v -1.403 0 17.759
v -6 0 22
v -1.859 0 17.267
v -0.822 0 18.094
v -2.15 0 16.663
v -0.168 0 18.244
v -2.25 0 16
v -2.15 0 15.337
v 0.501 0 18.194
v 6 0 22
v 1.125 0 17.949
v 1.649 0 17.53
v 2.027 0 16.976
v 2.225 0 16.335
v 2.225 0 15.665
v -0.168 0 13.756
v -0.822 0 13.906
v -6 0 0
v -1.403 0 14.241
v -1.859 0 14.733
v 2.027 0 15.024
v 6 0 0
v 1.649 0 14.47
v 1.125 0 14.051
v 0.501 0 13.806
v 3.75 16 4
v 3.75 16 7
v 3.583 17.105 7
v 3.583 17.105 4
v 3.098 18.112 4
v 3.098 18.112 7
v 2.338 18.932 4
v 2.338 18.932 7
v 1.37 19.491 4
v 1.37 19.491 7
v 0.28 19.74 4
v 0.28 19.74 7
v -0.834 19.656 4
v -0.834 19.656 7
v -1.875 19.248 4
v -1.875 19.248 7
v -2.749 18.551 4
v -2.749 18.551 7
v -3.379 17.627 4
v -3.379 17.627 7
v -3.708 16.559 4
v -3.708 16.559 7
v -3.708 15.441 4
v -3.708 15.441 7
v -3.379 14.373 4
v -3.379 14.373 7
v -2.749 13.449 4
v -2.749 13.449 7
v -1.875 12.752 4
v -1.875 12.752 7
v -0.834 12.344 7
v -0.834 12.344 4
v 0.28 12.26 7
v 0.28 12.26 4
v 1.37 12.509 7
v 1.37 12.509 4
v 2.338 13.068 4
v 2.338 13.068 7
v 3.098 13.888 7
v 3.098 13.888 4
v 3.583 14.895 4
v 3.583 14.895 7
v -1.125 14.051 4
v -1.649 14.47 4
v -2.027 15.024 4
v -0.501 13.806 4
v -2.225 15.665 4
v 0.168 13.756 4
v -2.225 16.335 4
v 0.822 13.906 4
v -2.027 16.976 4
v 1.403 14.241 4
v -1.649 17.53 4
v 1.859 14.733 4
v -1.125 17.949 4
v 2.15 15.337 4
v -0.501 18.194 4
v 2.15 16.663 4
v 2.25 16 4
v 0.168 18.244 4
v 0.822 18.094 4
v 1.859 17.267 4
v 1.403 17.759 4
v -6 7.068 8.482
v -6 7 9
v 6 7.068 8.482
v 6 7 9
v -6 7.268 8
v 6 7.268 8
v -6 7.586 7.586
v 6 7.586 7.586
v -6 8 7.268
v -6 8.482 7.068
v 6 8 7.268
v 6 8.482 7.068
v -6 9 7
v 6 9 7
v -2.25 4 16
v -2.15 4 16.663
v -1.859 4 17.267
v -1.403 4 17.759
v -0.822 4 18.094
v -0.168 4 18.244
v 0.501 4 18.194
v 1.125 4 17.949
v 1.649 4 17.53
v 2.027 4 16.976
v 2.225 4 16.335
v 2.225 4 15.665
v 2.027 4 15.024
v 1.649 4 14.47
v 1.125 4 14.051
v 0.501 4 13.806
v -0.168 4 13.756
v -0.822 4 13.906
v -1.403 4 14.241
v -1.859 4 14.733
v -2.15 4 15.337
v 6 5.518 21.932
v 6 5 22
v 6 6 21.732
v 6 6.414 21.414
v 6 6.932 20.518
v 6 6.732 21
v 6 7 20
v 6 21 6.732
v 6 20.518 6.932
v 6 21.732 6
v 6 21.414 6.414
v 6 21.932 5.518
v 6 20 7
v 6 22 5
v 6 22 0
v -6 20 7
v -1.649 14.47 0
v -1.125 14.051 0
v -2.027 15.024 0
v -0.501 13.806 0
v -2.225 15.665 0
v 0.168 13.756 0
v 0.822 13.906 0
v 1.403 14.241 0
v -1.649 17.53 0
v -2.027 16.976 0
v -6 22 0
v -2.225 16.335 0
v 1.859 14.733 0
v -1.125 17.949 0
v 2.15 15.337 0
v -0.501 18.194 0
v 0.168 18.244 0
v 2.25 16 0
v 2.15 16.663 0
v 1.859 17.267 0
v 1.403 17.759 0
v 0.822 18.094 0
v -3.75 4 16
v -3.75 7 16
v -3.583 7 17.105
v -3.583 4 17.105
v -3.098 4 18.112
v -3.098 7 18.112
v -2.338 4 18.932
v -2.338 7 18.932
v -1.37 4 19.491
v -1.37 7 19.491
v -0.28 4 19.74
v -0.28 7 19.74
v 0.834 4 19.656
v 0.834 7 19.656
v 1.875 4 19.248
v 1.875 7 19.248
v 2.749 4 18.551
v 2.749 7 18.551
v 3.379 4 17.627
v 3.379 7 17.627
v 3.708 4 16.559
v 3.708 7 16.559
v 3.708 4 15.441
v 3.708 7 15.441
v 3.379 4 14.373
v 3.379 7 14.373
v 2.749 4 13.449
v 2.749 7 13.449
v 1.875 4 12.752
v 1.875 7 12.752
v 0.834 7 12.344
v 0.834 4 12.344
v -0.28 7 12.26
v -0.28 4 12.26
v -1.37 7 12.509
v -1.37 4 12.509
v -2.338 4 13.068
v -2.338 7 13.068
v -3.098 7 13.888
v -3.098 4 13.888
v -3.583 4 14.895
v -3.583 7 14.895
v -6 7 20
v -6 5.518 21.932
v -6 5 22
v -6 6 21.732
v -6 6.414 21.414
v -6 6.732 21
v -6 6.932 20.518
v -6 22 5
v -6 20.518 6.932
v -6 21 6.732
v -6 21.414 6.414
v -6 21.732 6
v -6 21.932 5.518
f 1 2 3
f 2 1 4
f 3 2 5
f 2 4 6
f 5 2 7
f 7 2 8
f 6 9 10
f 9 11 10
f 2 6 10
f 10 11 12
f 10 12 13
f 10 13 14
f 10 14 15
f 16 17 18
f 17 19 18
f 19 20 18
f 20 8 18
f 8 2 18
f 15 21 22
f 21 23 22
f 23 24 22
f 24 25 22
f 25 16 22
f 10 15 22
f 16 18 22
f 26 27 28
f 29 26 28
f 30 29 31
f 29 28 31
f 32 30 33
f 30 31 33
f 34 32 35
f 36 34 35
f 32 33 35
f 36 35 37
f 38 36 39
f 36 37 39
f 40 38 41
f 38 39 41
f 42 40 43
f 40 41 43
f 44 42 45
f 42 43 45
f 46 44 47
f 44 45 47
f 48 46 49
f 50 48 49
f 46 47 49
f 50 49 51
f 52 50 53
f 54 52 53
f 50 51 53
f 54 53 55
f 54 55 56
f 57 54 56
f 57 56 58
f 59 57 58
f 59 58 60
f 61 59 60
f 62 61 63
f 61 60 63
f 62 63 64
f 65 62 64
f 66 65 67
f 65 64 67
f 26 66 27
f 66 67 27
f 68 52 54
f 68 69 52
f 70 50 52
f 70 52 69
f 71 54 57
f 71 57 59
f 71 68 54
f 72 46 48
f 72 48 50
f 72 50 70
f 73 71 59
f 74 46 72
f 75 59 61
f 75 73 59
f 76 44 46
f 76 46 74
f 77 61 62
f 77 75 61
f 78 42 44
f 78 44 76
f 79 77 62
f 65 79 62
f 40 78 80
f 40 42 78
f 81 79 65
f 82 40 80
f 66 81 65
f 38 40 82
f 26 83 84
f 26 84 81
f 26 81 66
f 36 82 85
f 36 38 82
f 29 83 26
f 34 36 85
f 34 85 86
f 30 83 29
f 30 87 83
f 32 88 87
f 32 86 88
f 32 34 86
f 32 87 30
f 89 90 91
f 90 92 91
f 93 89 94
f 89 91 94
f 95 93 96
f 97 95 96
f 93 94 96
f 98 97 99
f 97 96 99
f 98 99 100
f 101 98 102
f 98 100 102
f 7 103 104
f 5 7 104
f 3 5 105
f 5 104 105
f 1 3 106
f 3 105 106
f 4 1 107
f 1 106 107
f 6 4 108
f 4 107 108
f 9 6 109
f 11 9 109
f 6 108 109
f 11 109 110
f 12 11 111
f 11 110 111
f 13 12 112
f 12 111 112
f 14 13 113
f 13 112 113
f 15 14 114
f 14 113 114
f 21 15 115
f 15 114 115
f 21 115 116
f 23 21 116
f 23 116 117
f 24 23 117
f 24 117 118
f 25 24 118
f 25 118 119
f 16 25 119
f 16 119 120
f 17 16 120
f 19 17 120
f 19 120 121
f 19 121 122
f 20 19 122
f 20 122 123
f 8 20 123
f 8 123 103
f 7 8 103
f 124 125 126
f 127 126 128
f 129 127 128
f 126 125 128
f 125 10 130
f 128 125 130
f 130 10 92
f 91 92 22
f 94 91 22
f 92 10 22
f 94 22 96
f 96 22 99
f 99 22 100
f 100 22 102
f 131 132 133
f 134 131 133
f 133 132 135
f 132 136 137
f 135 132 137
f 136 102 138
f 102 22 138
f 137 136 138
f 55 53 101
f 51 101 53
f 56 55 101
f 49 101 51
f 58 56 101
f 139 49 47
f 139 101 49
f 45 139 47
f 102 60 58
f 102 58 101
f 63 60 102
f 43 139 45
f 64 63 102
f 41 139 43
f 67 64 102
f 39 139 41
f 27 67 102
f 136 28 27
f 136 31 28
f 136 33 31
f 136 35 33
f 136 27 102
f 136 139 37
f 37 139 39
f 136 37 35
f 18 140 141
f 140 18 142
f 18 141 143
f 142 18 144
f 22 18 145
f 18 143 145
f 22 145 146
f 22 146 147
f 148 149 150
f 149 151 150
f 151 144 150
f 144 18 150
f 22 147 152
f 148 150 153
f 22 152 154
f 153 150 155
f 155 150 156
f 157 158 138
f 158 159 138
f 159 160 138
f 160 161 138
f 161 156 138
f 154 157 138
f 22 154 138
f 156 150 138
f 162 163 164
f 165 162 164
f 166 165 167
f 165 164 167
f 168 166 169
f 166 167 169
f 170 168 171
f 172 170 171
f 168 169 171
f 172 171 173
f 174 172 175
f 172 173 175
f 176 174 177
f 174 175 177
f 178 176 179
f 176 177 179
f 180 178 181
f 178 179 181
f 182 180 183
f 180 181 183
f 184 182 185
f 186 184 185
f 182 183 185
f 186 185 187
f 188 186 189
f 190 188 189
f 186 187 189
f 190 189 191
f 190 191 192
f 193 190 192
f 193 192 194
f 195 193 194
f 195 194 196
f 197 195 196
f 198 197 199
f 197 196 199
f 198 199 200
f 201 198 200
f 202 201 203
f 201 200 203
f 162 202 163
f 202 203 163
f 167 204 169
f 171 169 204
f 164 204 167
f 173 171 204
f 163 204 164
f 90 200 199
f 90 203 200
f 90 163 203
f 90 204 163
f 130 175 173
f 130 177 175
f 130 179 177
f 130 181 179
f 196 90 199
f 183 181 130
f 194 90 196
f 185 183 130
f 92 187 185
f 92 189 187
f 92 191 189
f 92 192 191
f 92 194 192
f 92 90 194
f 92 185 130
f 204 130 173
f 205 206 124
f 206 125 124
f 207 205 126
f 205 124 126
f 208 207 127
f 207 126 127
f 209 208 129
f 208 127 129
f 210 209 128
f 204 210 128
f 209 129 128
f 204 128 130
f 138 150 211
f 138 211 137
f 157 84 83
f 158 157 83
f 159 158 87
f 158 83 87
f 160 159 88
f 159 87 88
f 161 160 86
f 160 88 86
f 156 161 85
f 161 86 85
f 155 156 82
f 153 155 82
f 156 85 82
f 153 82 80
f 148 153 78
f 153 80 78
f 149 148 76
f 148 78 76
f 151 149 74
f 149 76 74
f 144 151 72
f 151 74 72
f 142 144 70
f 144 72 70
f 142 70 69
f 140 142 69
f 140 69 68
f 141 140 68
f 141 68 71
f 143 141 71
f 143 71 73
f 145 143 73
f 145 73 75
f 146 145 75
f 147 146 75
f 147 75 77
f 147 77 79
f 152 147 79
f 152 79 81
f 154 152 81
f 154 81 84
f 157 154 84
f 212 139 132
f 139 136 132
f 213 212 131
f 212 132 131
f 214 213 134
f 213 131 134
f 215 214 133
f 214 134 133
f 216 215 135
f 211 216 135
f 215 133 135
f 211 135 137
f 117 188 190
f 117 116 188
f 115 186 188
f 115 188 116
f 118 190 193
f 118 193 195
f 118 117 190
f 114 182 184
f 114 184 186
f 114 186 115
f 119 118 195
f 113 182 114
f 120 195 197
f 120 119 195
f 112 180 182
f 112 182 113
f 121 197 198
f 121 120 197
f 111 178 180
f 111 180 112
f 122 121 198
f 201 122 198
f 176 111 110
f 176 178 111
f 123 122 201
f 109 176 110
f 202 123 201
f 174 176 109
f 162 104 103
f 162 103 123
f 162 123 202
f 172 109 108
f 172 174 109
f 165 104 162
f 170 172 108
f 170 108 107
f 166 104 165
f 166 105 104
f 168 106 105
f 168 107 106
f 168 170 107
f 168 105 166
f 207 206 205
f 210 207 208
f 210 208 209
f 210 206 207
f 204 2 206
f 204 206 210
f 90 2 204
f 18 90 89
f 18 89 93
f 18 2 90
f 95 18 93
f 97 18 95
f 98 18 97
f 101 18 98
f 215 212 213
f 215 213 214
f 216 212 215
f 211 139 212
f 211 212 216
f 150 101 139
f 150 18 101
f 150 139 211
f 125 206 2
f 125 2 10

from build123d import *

# Parameters (mm, degrees)
SKETCH_W        = 12
SKETCH_H        = 22
PAD_DEPTH       = 7
SKETCH001_W     = 12
SKETCH001_H     = 7
PAD001_DEPTH    = 15
SKETCH002_R     = 2.25
POCKET_DEPTH    = 10
SKETCH003_R     = 3.75
POCKET001_DEPTH = 3
SKETCH004_R     = 2.25
POCKET002_DEPTH = 7
SKETCH005_R     = 3.75
POCKET003_DEPTH = 3
FILLET_R        = 2


with BuildPart() as part:
    # Sketch → Pad (new body)
    with BuildSketch(Plane.XY):
        with Locations((0, 11)):
            Rectangle(SKETCH_W, SKETCH_H)
    extrude(amount=PAD_DEPTH)

    # Sketch001 (on Face6 of Pad) → Pad001 (join)
    with BuildSketch(Plane.XY.offset(7)):
        with Locations((0, 3.5)):
            Rectangle(SKETCH001_W, SKETCH001_H)
    extrude(amount=PAD001_DEPTH)

    # Sketch002 (on Face3 of Pad001) → Pocket (cut)
    with BuildSketch(Plane.XY.offset(7)):
        with Locations((0, 16)):
            Circle(SKETCH002_R)
    extrude(amount=-POCKET_DEPTH, mode=Mode.SUBTRACT)

    # Sketch003 (on Face9 of Pocket) → Pocket001 (cut)
    with BuildSketch(Plane.XY.offset(7)):
        with Locations((0, 16)):
            Circle(SKETCH003_R)
    extrude(amount=-POCKET001_DEPTH, mode=Mode.SUBTRACT)

    # Sketch004 (on Face8 of Pocket001) → Pocket002 (cut)
    with BuildSketch(Plane(origin=(0, 7, 0), x_dir=(-1, 0, 0), z_dir=(0, 1, 0))):
        with Locations((0, 16)):
            Circle(SKETCH004_R)
    extrude(amount=-POCKET002_DEPTH, mode=Mode.SUBTRACT)

    # Sketch005 (on Face9 of Pocket002) → Pocket003 (cut)
    with BuildSketch(Plane(origin=(0, 7, 0), x_dir=(-1, 0, 0), z_dir=(0, 1, 0))):
        with Locations((0, 16)):
            Circle(SKETCH005_R)
    extrude(amount=-POCKET003_DEPTH, mode=Mode.SUBTRACT)

    # Fillet
    fillet_edges = [part.edges().sort_by_distance(p)[0] for p in [
        (0, 7, 7),
        (0, 7, 22),
        (0, 22, 7),
    ]]
    fillet(fillet_edges, radius=FILLET_R)


solid = part.part
